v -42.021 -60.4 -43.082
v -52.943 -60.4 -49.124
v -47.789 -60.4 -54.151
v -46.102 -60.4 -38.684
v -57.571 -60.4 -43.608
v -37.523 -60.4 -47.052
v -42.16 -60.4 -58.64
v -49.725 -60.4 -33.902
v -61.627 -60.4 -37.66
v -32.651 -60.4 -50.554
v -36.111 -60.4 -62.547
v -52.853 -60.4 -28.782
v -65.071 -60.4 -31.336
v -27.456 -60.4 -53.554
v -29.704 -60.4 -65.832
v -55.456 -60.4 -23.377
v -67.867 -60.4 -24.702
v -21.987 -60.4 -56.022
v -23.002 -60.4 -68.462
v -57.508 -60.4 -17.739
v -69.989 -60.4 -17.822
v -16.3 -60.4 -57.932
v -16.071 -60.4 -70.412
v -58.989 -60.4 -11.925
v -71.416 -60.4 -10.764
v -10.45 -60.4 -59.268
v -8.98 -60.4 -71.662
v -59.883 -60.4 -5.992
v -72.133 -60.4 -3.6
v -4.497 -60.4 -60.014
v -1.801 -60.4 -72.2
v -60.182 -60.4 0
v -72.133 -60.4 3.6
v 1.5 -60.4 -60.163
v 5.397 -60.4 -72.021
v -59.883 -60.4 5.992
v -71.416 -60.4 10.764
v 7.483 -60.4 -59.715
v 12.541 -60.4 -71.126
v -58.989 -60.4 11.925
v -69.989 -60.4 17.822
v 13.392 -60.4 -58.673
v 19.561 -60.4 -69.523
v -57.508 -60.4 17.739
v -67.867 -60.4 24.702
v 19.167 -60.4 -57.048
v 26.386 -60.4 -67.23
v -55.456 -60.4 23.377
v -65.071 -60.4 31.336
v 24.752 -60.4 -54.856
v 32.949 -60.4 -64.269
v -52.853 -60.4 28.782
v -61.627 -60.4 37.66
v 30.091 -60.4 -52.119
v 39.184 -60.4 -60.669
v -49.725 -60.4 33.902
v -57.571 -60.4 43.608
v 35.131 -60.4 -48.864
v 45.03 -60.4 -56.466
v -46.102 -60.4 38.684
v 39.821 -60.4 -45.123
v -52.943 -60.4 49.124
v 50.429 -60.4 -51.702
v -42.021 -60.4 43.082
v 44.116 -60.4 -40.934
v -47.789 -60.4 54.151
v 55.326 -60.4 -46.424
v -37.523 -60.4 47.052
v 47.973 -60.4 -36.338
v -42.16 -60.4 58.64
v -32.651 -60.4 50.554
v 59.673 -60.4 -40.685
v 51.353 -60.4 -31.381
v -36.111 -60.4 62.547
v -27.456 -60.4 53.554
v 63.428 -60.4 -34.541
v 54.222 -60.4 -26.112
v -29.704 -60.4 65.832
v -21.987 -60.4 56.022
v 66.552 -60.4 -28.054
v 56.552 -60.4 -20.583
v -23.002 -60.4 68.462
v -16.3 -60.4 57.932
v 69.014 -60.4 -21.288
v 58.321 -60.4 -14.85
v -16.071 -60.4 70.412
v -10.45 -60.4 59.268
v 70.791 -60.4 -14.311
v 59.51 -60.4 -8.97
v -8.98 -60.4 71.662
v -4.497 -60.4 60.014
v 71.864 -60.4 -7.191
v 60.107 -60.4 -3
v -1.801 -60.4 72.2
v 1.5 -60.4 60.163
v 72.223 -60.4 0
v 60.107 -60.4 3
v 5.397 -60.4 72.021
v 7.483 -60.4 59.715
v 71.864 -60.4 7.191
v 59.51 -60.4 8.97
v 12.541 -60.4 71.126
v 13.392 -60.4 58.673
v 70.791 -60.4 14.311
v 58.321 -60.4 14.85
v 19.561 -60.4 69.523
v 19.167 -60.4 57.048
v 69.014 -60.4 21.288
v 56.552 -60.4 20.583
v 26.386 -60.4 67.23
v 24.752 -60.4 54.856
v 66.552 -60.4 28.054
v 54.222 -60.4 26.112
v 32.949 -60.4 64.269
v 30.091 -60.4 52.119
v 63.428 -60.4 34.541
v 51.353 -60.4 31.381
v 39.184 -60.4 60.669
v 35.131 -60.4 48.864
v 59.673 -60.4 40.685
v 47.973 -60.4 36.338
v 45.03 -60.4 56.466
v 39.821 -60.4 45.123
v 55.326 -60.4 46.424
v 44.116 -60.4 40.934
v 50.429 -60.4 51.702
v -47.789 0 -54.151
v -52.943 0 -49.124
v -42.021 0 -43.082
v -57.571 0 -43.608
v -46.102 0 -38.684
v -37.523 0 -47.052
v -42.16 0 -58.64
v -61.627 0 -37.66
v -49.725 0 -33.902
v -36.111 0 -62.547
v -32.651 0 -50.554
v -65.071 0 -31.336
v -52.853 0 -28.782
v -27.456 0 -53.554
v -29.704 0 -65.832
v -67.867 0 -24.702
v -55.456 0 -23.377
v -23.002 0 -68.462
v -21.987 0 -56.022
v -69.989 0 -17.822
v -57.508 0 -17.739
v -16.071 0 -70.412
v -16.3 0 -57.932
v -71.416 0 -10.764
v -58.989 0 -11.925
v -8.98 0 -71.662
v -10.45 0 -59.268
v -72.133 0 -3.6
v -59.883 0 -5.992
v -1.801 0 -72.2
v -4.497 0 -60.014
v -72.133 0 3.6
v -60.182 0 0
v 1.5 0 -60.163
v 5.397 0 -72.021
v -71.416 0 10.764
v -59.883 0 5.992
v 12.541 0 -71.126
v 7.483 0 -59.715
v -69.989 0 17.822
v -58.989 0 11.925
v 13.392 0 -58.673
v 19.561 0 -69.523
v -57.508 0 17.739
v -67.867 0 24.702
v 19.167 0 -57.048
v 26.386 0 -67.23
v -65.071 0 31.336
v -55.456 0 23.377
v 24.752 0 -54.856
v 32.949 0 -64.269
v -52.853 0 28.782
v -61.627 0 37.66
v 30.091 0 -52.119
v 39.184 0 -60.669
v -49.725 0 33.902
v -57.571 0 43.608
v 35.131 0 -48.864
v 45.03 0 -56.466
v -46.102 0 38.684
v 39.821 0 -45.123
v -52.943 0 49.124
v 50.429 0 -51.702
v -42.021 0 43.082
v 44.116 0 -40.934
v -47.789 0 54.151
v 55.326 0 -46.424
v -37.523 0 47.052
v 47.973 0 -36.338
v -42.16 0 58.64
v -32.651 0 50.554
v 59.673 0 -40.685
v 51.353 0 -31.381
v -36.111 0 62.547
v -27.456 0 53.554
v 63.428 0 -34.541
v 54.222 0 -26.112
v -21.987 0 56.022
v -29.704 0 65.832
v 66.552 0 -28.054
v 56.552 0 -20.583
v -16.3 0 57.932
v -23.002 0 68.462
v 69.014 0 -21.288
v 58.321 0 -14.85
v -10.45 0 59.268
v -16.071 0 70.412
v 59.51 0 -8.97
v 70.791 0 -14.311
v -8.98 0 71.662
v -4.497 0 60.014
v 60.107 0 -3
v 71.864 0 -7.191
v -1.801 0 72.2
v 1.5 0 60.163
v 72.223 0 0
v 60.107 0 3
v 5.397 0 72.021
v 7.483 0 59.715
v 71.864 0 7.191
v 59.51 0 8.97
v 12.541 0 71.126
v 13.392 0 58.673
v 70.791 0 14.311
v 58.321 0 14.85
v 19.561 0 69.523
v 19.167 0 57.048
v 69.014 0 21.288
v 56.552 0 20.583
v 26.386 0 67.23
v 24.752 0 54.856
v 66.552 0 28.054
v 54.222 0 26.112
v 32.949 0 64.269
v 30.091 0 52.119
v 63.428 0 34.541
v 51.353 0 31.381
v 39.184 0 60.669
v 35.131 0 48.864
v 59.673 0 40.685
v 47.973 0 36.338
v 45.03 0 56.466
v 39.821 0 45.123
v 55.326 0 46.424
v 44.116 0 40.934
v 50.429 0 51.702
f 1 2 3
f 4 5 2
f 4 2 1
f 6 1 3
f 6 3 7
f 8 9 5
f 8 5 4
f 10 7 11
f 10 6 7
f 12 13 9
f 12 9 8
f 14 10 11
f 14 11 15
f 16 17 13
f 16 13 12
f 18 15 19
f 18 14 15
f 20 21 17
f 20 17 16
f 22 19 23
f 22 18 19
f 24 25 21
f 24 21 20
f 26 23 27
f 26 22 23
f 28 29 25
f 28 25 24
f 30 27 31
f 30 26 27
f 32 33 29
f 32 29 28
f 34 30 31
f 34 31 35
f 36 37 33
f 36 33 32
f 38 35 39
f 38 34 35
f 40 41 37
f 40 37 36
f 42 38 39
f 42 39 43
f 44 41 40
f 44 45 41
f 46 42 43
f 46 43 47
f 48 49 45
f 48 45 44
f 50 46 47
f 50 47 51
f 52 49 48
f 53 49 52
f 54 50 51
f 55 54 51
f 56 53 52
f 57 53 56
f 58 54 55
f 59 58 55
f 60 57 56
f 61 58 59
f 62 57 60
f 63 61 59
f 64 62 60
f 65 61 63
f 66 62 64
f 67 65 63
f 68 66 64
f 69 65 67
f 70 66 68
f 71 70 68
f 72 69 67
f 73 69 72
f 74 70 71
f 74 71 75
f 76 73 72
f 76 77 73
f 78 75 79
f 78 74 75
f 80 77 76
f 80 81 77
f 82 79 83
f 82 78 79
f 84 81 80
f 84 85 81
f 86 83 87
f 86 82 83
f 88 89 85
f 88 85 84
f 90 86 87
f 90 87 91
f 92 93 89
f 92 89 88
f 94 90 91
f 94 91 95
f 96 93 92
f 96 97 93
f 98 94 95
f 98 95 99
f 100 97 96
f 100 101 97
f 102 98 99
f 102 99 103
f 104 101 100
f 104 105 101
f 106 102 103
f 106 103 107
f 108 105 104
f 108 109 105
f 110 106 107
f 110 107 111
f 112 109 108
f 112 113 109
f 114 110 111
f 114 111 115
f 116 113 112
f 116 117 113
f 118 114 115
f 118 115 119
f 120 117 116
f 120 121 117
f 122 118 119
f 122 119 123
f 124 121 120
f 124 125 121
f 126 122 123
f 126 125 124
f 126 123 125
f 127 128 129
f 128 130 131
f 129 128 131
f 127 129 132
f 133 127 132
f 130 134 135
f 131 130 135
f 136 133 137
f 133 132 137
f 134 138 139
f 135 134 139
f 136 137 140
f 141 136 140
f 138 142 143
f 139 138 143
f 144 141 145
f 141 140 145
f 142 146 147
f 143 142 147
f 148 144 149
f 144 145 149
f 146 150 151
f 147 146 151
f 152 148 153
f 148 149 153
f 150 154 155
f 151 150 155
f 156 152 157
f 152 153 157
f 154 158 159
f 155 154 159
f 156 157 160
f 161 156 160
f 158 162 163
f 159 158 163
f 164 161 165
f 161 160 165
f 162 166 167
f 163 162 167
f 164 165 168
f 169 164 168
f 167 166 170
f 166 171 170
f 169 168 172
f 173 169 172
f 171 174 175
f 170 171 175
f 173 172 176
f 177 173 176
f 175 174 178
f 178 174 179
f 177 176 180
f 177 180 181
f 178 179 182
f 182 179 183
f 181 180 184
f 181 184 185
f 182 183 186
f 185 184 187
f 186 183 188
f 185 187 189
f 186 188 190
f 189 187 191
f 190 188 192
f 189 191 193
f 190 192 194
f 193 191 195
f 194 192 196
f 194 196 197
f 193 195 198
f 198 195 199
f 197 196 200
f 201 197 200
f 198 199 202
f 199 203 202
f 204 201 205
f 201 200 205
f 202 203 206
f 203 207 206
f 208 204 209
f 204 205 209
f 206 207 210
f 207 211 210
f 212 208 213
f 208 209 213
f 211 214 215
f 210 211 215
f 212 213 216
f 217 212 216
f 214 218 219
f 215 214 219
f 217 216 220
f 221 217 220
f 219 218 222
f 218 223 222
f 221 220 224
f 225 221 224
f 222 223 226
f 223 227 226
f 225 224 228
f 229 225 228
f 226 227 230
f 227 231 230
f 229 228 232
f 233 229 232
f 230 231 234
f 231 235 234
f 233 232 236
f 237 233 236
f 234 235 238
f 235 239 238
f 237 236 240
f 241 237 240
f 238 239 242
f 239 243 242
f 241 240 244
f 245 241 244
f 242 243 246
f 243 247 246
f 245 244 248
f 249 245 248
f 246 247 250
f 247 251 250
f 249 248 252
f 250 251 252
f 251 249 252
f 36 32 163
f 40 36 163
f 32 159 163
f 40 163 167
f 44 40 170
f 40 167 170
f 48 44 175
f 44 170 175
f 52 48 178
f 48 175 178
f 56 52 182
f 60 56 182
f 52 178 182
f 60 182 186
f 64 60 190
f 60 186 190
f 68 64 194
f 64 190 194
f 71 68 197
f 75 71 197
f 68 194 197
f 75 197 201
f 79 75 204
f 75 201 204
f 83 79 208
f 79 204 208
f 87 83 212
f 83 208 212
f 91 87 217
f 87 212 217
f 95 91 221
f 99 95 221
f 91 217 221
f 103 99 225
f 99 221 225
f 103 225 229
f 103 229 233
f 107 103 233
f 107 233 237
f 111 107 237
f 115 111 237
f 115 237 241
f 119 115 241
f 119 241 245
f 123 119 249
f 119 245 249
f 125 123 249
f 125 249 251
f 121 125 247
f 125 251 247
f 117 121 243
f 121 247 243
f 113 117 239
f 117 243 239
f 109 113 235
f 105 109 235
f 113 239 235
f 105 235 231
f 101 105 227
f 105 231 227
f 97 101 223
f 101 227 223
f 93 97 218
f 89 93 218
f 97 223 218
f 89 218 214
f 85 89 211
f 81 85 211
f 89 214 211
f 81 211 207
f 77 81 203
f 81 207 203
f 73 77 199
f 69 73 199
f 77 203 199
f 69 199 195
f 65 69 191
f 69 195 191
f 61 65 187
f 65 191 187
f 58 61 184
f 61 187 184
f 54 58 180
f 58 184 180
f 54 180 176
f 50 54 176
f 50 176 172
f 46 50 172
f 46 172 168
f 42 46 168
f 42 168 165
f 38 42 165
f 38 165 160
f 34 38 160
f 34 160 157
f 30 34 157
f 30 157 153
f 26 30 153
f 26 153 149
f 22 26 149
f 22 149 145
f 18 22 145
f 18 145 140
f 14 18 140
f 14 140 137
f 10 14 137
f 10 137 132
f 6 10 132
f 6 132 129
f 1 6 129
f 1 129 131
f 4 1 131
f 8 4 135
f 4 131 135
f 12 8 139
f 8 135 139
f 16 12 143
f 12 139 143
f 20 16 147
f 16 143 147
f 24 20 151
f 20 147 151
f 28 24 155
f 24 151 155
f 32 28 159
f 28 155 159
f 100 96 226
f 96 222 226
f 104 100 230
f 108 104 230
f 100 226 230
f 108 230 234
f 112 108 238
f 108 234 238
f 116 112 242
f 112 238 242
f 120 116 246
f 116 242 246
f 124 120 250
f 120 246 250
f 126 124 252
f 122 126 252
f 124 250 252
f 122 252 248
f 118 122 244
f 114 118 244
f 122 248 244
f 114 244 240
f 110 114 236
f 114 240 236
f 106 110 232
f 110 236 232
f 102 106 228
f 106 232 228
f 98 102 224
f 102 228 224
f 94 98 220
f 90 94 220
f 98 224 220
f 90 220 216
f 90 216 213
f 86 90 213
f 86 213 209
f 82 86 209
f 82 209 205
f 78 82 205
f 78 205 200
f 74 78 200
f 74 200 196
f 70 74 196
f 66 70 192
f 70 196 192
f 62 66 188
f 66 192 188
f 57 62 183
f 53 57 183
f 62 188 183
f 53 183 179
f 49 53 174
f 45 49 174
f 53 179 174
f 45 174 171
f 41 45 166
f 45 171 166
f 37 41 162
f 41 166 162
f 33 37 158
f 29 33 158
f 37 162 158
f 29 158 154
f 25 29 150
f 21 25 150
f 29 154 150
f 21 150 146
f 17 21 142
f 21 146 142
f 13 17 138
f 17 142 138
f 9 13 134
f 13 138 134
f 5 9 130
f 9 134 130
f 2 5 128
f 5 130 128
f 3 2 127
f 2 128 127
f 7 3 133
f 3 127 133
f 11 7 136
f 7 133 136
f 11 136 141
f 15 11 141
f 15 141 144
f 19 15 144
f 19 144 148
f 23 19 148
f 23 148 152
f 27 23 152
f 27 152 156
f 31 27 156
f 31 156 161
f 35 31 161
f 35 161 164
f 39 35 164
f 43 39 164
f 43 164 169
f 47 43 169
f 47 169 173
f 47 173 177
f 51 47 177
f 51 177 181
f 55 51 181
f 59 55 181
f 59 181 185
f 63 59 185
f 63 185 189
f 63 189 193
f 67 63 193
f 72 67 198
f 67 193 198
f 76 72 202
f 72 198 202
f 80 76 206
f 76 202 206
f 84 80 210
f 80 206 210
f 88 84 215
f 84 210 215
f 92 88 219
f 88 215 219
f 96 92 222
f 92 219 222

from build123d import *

# Parameters (mm, degrees)
F0_R     = 72.2228243582
F1_DEPTH = 10
F2_R     = 72.2228243582
F3_DEPTH = 25.4
F5_R     = 13.3709609509
F6_DEPTH = 226
F4_R     = 60.1818073618
F7_DEPTH = 139.5800691098
F8_DEPTH = 25


# Not quite as in the source:
# - an extrude ends at something that could not be found from the text; its depth is read off the source's solid


with BuildPart() as f1:
    # F0 (on Front) → F1 (new body)
    with BuildSketch(Plane.XZ):
        Circle(F0_R)
    extrude(amount=F1_DEPTH)

    # F2 (on face) → F3 (join)
    with BuildSketch(Plane.XZ.offset(10)):
        Circle(F2_R)
    extrude(amount=F3_DEPTH)

    # F5 (on Front) → F6 (cut, through all)
    with BuildSketch(Plane.XZ):
        with Locations((0, 13.3709609509)):
            Circle(F5_R)
    extrude(amount=-F6_DEPTH, mode=Mode.SUBTRACT)

    # F4 (on face) → F7 (cut)
    with BuildSketch(Plane(origin=(0, 0, 0), x_dir=(-1, 0, 0), z_dir=(0, 1, 0))):
        Circle(F4_R)
    extrude(amount=-F7_DEPTH, mode=Mode.SUBTRACT)

    # F8 (add): a face of the model
    f8_faces = [f1.faces().sort_by_distance(p)[0] for p in [
        (-70.1800544038, -35.4, 0),
    ]]
    extrude(f8_faces, amount=F8_DEPTH)


solid = f1.part
